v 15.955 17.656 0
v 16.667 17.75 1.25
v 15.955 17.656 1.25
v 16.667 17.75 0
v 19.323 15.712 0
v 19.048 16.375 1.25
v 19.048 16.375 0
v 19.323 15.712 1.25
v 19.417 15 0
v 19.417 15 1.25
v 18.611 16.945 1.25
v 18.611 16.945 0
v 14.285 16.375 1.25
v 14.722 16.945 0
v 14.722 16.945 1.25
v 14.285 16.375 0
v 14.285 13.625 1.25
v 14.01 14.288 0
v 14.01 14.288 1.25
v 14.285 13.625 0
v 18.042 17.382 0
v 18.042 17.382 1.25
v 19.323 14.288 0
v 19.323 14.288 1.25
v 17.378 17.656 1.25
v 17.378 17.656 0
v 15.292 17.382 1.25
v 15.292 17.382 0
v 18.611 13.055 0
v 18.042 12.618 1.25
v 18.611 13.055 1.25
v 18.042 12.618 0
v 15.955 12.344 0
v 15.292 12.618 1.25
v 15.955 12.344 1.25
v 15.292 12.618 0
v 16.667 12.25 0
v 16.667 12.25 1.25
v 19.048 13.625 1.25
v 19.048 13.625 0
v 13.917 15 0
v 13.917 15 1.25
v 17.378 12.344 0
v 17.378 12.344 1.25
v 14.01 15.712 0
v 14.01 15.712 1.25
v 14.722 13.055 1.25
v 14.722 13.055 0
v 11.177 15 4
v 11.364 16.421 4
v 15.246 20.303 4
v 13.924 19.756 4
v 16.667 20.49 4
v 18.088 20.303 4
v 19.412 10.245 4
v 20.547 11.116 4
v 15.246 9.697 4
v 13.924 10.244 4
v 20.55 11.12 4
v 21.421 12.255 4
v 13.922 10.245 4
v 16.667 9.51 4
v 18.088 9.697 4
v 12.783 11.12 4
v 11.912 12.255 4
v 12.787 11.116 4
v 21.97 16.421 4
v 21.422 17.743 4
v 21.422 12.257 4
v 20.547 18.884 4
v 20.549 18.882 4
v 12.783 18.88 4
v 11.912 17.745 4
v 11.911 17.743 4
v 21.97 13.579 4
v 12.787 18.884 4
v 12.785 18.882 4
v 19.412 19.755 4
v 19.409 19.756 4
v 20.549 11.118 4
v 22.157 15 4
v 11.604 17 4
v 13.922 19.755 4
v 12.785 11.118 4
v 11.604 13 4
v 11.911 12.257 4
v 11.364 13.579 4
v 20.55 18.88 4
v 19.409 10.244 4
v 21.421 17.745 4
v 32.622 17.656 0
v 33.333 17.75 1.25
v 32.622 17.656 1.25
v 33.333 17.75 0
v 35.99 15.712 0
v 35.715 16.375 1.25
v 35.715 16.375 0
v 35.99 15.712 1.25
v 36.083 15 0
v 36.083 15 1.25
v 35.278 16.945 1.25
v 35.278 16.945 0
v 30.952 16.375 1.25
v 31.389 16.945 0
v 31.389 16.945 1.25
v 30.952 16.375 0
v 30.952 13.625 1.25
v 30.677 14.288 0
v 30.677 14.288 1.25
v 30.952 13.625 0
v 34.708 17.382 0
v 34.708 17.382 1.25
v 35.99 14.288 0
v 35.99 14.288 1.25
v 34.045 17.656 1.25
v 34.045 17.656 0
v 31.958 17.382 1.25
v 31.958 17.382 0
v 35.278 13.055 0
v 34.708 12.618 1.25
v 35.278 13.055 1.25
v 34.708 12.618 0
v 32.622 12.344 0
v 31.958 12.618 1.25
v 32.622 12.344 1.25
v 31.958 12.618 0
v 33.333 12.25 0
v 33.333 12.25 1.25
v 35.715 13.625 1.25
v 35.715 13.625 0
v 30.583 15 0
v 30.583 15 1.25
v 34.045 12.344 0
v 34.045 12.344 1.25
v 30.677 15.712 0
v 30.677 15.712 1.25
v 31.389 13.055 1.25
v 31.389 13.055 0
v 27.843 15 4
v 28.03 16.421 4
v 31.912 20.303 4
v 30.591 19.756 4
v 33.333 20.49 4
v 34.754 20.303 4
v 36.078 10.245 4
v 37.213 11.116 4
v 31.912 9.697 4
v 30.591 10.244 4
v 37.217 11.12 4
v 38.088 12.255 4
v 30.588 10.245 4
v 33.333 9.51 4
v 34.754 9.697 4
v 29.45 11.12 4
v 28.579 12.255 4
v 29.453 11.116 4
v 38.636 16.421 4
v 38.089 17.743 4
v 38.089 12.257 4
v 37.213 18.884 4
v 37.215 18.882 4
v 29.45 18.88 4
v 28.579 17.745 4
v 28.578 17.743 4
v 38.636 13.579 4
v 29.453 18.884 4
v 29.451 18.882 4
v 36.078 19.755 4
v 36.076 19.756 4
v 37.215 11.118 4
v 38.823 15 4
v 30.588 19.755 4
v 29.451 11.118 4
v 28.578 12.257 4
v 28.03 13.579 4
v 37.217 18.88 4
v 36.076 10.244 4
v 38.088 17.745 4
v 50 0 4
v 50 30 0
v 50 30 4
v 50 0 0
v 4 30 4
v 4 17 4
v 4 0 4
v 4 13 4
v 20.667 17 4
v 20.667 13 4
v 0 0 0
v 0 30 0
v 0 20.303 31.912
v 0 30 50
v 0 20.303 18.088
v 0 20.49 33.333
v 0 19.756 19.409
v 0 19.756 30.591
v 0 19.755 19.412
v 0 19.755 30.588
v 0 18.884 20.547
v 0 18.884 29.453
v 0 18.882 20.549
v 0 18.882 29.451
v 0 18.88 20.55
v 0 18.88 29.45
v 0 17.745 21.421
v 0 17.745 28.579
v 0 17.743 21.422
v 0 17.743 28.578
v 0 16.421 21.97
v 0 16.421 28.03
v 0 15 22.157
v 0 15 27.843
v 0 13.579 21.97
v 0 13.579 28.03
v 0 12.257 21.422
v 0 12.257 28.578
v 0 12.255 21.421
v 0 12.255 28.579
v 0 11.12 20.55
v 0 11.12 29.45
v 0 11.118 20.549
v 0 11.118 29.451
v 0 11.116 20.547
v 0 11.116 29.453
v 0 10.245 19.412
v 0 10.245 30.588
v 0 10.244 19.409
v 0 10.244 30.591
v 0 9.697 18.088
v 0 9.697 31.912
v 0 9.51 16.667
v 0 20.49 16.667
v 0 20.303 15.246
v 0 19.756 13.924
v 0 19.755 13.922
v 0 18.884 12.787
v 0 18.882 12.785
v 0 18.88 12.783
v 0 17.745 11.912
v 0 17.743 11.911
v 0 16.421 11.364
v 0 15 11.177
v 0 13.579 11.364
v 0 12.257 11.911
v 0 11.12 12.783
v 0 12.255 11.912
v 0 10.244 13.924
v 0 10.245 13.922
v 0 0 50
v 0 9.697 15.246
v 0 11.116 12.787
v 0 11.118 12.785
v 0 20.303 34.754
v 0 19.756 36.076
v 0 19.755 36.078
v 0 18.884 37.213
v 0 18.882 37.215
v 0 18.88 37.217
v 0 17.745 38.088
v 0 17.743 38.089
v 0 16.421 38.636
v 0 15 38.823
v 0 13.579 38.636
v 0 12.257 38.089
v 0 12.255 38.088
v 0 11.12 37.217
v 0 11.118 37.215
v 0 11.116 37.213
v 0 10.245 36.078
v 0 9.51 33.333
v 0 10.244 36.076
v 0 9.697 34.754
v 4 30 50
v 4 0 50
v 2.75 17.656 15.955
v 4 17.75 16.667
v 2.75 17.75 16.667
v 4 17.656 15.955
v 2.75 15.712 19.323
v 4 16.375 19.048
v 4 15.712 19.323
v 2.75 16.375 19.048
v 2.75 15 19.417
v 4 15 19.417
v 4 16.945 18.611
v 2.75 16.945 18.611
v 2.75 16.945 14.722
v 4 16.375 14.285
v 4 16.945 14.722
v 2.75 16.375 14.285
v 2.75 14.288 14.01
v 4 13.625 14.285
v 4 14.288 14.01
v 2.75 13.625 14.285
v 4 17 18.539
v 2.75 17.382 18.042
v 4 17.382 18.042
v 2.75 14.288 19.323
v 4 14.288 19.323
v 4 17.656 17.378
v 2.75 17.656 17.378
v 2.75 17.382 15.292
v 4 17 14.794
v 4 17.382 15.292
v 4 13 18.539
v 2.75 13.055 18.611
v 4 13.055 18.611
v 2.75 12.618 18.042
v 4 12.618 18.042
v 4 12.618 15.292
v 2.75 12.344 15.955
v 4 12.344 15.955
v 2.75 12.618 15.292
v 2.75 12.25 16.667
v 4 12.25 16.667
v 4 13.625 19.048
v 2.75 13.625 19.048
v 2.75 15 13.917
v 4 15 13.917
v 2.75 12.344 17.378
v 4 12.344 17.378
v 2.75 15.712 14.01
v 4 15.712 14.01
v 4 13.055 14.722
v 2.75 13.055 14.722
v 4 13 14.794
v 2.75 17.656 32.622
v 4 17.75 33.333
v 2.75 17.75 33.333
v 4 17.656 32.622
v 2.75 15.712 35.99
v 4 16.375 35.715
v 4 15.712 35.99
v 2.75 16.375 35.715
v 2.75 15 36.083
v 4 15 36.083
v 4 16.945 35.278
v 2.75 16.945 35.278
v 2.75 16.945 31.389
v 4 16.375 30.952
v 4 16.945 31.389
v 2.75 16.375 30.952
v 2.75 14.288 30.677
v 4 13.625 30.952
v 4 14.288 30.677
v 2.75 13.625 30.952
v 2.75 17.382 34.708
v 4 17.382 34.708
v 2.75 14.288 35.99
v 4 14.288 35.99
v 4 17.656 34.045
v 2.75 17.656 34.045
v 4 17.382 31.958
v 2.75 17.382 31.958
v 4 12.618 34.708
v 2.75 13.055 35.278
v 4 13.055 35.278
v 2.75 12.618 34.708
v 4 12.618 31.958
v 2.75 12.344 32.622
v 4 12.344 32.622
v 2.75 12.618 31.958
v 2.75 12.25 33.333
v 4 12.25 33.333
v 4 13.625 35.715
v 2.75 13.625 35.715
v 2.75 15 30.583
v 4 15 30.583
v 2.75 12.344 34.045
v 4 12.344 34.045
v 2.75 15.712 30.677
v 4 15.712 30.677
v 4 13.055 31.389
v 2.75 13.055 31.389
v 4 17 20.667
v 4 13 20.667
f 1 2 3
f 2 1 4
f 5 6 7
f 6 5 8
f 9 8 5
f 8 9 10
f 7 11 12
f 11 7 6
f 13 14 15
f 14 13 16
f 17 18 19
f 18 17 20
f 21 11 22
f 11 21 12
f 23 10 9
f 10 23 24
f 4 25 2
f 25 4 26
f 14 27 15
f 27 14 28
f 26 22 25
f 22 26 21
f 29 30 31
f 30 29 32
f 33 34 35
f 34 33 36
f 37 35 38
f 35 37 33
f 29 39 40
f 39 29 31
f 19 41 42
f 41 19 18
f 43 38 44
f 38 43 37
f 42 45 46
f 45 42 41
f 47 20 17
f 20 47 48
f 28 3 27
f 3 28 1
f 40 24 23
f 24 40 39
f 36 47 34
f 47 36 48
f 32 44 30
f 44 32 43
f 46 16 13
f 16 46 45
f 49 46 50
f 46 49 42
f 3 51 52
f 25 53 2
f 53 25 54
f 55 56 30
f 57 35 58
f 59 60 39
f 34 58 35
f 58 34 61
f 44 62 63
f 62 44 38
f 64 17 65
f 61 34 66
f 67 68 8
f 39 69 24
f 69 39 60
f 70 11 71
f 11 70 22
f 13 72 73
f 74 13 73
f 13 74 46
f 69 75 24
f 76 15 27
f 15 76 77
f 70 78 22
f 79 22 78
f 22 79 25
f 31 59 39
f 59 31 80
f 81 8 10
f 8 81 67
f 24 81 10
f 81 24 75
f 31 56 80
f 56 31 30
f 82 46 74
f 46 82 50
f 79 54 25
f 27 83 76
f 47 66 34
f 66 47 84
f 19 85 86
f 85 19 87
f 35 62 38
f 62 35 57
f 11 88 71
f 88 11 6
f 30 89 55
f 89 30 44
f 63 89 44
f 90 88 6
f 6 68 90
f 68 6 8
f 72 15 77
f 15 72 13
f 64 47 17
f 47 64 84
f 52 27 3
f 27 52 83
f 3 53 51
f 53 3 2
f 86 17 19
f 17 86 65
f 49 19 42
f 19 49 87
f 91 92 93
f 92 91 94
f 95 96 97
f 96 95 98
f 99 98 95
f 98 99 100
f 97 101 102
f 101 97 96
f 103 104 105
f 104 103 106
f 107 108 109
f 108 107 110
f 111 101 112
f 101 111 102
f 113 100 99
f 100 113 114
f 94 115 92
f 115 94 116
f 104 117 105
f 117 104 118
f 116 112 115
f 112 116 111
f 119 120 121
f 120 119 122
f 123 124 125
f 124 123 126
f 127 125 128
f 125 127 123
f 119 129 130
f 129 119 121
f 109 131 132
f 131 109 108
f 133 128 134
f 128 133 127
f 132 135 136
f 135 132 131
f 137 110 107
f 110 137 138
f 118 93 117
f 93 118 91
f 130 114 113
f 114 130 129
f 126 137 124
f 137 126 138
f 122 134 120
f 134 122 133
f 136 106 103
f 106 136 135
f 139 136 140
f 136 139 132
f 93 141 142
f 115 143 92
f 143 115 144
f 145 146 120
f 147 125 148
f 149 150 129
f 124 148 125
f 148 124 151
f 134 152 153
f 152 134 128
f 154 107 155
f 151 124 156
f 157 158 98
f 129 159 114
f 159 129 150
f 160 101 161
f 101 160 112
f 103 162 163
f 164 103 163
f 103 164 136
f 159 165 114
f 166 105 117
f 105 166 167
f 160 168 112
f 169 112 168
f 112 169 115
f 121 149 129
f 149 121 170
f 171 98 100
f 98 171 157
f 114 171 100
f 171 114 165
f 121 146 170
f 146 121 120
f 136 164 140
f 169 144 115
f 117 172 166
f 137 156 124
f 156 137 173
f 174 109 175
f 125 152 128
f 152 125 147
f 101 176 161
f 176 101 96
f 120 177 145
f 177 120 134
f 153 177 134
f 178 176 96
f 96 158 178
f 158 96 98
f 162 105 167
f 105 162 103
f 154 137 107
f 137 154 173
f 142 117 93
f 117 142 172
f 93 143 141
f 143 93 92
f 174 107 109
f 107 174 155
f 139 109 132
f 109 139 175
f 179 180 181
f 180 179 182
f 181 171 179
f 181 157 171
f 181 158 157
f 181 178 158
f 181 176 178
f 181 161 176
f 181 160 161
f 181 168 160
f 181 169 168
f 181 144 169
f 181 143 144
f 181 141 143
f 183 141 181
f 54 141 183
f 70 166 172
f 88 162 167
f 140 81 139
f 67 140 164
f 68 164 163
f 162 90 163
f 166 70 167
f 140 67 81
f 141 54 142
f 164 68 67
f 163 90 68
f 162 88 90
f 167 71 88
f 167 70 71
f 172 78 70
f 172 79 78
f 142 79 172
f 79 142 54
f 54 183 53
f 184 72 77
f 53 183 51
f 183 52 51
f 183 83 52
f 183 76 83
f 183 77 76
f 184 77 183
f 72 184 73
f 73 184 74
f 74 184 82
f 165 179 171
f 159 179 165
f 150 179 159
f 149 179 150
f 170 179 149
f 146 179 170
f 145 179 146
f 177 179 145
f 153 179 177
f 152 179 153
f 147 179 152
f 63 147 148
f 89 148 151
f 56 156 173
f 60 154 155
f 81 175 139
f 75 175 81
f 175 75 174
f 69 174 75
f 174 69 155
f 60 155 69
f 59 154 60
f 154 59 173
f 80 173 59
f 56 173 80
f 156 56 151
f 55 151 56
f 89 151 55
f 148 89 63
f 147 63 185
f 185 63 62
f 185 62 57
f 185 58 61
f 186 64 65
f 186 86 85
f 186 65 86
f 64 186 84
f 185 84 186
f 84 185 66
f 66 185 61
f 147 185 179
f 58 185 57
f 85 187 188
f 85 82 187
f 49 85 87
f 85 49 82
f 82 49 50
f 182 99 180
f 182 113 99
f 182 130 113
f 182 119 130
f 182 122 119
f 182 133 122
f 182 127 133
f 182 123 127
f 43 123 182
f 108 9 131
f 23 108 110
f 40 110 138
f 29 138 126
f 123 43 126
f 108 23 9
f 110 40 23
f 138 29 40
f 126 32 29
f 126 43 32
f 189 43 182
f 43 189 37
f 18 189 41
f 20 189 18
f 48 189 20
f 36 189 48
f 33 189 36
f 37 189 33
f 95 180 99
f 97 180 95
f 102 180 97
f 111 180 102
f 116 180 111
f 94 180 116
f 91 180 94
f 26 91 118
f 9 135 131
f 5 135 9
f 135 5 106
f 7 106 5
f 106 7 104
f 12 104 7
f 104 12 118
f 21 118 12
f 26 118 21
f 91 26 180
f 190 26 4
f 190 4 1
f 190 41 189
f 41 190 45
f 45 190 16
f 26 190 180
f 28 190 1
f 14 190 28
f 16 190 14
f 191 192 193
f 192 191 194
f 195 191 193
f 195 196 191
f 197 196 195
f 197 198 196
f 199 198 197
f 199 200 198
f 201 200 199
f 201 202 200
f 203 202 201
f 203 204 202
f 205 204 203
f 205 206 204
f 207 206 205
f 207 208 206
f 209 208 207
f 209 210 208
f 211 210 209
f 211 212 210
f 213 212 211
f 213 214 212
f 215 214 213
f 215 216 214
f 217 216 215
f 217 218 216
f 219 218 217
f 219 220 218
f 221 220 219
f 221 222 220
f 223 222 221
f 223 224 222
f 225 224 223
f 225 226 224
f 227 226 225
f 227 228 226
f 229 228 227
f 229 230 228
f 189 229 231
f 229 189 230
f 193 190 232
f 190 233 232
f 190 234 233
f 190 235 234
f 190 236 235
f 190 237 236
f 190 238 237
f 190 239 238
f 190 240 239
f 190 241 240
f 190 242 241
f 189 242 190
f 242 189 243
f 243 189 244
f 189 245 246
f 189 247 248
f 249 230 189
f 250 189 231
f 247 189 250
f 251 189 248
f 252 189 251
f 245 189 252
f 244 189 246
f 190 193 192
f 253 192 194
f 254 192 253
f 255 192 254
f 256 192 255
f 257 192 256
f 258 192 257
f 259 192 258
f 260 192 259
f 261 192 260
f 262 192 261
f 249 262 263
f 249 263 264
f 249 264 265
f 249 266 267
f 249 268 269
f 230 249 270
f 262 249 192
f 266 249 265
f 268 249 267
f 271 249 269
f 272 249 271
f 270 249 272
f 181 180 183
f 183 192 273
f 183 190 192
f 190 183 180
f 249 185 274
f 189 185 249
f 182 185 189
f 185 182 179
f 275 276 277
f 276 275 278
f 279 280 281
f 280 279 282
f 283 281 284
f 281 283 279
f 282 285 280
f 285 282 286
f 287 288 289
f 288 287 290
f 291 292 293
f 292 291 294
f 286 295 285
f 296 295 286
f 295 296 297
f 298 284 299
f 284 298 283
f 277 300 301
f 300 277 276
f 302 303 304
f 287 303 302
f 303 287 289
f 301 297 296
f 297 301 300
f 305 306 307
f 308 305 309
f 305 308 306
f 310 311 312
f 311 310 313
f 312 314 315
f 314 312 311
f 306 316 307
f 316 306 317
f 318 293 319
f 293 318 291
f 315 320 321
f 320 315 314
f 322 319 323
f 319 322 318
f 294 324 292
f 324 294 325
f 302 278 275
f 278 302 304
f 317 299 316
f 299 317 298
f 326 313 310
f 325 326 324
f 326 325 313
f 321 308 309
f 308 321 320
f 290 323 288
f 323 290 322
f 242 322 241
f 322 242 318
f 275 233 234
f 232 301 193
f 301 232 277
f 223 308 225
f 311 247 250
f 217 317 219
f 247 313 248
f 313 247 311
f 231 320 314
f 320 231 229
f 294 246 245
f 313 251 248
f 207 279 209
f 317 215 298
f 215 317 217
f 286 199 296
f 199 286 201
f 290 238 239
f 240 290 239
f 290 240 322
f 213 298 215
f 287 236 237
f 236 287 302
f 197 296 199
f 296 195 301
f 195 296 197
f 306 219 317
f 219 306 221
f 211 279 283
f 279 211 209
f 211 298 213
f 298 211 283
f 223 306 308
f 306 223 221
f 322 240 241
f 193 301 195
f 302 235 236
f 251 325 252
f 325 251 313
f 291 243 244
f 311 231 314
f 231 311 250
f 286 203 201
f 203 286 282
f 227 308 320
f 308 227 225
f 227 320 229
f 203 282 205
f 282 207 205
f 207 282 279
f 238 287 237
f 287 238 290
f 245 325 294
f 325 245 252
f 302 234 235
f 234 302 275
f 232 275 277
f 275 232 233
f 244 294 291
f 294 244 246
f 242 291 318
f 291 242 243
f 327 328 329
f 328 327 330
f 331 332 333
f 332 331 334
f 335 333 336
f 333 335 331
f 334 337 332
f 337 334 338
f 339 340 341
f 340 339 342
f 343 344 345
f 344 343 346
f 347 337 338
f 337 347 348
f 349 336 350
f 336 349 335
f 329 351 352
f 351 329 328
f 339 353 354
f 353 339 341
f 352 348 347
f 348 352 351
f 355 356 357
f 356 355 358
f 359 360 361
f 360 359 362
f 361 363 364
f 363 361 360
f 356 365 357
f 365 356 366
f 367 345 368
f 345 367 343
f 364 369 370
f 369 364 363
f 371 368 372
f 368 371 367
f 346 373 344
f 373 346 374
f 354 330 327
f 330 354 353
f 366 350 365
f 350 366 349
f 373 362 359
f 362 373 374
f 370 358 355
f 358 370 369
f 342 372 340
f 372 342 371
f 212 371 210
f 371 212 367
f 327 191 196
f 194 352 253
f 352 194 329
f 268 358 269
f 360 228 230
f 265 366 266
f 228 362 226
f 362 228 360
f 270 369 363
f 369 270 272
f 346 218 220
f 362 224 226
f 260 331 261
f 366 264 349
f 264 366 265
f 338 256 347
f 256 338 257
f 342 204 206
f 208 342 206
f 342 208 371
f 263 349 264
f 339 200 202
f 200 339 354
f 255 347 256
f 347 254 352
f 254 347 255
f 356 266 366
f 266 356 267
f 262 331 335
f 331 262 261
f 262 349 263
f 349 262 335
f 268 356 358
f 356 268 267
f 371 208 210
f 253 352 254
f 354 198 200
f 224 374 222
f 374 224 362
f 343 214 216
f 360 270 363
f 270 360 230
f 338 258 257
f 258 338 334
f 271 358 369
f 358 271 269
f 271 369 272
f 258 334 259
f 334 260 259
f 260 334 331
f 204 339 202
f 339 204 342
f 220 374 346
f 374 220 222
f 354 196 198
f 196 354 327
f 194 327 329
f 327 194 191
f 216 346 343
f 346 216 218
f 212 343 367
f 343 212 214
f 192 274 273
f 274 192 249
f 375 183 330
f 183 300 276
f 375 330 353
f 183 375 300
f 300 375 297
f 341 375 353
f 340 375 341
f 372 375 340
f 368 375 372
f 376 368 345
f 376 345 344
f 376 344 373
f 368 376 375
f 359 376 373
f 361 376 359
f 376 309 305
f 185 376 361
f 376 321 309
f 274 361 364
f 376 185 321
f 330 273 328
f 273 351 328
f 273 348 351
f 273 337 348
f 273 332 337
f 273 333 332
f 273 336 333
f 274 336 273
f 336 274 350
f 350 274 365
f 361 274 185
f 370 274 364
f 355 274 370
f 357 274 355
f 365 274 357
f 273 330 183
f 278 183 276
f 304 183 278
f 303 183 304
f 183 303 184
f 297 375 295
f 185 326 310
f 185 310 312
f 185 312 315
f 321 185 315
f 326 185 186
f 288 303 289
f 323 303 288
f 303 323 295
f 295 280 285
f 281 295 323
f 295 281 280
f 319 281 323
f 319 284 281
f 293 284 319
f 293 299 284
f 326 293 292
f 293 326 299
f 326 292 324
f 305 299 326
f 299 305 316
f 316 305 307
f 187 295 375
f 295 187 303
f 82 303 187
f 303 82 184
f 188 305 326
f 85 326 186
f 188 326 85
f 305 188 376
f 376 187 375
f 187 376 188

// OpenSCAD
// file: lib/fasteners.scad
// Holes for screws, used by bracket.scad.

// A hole of diameter `d` through a plate `t` thick, countersunk at the top.
module countersunk(d, t, $fn = 24) {
    translate([0, 0, -1]) cylinder(d = d, h = t + 2);
    translate([0, 0, t - d / 2]) cylinder(d1 = d, d2 = 2 * d, h = d / 2 + 0.01);
}
// main file
// An angle bracket with screw holes and a gusset.

thickness = 4;
length = 50;
width = 30;
hole_d = 5.5; // [3:0.5:10]
holes = 2; // [1:4]
fillet = true;

include <lib/fasteners.scad>

module plate() {
    difference() {
        cube([length, width, thickness]);
        for (i = [1:holes])
            translate([length * i / (holes + 1), width / 2, 0])
                countersunk(hole_d, thickness);
    }
}

module gusset() {
    translate([thickness, width / 2 + thickness / 2, thickness])
        rotate([90, 0, 0])
            linear_extrude(height = thickness)
                polygon([[0, 0], [length / 3, 0], [0, length / 3]]);
}

union() {
    plate();
    // The upright leg: the plate turned up about the Y axis.
    translate([thickness, 0, 0]) rotate([0, -90, 0]) plate();
    if (fillet) gusset();
}
